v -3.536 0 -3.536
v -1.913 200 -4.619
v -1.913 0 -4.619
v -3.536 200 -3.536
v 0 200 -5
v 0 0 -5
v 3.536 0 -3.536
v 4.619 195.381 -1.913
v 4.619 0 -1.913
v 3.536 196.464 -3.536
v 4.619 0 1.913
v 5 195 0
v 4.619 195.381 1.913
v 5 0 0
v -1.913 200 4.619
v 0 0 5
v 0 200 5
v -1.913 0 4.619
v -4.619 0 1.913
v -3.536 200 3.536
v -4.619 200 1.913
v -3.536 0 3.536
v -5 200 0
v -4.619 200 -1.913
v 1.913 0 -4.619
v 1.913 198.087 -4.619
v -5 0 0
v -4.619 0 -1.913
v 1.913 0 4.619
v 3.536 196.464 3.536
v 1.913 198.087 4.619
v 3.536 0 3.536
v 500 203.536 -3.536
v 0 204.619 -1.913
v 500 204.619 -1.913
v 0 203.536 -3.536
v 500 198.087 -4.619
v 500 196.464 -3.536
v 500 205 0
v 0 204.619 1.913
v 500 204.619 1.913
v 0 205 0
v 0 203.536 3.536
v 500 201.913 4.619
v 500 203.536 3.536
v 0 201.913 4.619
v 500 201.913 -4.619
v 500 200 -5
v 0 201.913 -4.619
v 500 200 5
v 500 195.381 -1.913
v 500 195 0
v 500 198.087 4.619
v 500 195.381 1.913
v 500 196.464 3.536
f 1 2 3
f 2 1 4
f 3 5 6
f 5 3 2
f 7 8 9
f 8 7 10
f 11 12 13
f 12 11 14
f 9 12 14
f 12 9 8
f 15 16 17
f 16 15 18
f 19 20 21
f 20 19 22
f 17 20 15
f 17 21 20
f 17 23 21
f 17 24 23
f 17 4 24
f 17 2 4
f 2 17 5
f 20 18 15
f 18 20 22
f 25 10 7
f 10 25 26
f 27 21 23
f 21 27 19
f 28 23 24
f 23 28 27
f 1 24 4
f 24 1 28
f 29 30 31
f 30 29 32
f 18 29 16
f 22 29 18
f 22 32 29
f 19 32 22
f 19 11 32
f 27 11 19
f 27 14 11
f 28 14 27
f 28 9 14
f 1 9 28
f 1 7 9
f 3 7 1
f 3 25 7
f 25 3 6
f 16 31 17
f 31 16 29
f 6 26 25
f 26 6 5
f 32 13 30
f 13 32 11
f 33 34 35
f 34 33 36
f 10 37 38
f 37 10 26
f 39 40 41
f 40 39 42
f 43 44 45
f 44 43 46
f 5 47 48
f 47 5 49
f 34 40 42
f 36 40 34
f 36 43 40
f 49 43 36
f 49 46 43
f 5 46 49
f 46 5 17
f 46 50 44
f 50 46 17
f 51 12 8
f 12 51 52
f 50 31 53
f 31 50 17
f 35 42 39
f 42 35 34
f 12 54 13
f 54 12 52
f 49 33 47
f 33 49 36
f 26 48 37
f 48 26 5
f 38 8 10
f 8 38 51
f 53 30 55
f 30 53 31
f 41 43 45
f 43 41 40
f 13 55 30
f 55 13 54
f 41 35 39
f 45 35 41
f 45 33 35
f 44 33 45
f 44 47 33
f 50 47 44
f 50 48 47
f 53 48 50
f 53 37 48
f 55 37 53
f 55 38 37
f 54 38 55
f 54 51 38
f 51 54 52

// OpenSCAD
// file: Part-Constants.scad
// PART CONSTANT Configuration File
//  last modified October 5 2021 by SrAmo

// conversions
mm_inch = 1/25.4;

// 1/4 ID bearing OD if using a bearing (PART FR4-ZZ C3)
Qtr_bearing_id = 0.25/mm_inch;
Qtr_bearing_od=0.628/mm_inch; // 0.628 inch = 15.9512 mm
Qtr_bearing_flange_od=0.71/mm_inch; // .71 inch = 18.034 mm
Qtr_bearing_flange_t=0.05/mm_inch; // 0.05 inch = 1.27 mm
Qtr_bearing_t=0.155/mm_inch; // 0.155 inch = 3.937 mm

// 1/2 ID flanged bearing 
Half_bearing_id=0.50/mm_inch;
Half_bearing_od=1.125/mm_inch;
Half_bearing_flange_od=1.23/mm_inch; 
Half_bearing_flange_t=0.06/mm_inch; 
Half_bearing_t=0.31/mm_inch; 

M6_bearing_od=12; 
M6_bearing_flange_od=13.6;
M6_bearing_flange_t=0.8;
M6_bearing_t=3.15;

// round belt diameter throughout, if used
//belt_d=4.826;   // 0.19 in = 4.826 mm

hole_qtr_inch=6.48;   // hole for 0.25 inch joint/bolt 0.255 inch = 6.477 mm
hole_no6_screw = 2.5; // hole start diameter for number 6 screw 0.095 inch = 2.413
hole_M3=3.1; // hole for M3 (3 mm) joint/bolt
//hole_M5=5.1;  
hole_M6=6.1;
hole_servo_bushing=3.81; // hole for servo bushing 0.15 inch = 3.81 mm

// STANDARD 40MM X 20MM X 40MM SERVO DIMENSIONS
svo_l = 40.66; // Servo Length for openings in parts
svo_w = 20.3; // Servo Width for openings in parts
svo_d = 42; // Servo Depth from Horn interface to bottom of part
svo_shaft = 10.6; // Servo dist from shaft to edge of body in length direction, was 10.2
svo_screw_l = 48.0; // Servo screw hole length between, was 49.5
svo_screw_w = 10; // Servo screw hole width between
svo_flange_l = 57; // Servo flange length, was 55
svo_flange_t = 3; // Servo flange thickness
svo_flange_d = 10; // Servo depth from Horn interface to top of flange
servo_horn_l=25;
servo_horn_d1=15.25;
servo_horn_d2=7.5;
servo_horn_t=7.4;

// Springs
//  McMaster Carr 9271K619, torsion spring, used in MAKE 2
9271K619_angle = 180; // free leg angle
9271K619_OD = 19.35; // mm
9271K619_wd = 1.9;  // wire diameter mm
9271K619_len = 51;  // arm length mm
9271K619_coils = 7;  // number of coils
9271K619_LH = true;  // LH or RH (false)
9271K619_t = (9271K619_coils+1)*9271K619_wd; // thickness of the spring
9271K619_ID = 9271K619_OD-2*9271K619_wd;  // ID of the coil

//  McMaster Carr 9271K589, torsion spring, used in MAKE 3
9271K589_angle = 90; // free leg angle
9271K589_OD = 21.54; // mm
9271K589_wd = 2.667;  // wire diameter mm
9271K589_len = 88.9;  // arm length mm
9271K589_coils = 5.25;  // number of coils
9271K589_LH = true;  // LH or RH (false)
9271K589_t = (9271K589_coils+1)*9271K589_wd; // thickness of the spring
9271K589_ID = 9271K589_OD-2*9271K589_wd;  // ID of the coil
//9271K589_Dshaft = 12.7; // The largest shaft that can go through spring

pot_shaft_dia = 6.2; // mm, potentiometer shaft dia
pot_lug_t = 8; // thickness of the lug over potentiometer shaft
// main file
/*
  A VERY BASIC ARM ASSEMBLY MODEL
  */
use <Robot_Arm_Parts_lib.scad>
lenAB=200;
lenBC=400;
LengthEnd=[100,0,0];
cyl_d = 10;
module draw_assy (A_angle=90,B_angle=0,C_angle=0,full=true) {
    origin=[0,0,0];
    b=[lenAB*cos(A_angle),lenAB*sin(A_angle),0];  
    c=[(cos(A_angle)*lenAB+cos(B_angle)*lenBC),(sin(A_angle)*lenAB+sin(B_angle)*lenBC),0];
    // AB link
    color("Plum",.5)  pt_pt_cylinder(from=origin, to=b, d=cyl_d);
    // BC link
    color("Blue",.5)  pt_pt_cylinder(from=b, to=c, d=cyl_d);
    // CD end effector
    color("Green",.5)  pt_pt_cylinder(from=c, to=c+LengthEnd, d=cyl_d);
}
draw_assy();
